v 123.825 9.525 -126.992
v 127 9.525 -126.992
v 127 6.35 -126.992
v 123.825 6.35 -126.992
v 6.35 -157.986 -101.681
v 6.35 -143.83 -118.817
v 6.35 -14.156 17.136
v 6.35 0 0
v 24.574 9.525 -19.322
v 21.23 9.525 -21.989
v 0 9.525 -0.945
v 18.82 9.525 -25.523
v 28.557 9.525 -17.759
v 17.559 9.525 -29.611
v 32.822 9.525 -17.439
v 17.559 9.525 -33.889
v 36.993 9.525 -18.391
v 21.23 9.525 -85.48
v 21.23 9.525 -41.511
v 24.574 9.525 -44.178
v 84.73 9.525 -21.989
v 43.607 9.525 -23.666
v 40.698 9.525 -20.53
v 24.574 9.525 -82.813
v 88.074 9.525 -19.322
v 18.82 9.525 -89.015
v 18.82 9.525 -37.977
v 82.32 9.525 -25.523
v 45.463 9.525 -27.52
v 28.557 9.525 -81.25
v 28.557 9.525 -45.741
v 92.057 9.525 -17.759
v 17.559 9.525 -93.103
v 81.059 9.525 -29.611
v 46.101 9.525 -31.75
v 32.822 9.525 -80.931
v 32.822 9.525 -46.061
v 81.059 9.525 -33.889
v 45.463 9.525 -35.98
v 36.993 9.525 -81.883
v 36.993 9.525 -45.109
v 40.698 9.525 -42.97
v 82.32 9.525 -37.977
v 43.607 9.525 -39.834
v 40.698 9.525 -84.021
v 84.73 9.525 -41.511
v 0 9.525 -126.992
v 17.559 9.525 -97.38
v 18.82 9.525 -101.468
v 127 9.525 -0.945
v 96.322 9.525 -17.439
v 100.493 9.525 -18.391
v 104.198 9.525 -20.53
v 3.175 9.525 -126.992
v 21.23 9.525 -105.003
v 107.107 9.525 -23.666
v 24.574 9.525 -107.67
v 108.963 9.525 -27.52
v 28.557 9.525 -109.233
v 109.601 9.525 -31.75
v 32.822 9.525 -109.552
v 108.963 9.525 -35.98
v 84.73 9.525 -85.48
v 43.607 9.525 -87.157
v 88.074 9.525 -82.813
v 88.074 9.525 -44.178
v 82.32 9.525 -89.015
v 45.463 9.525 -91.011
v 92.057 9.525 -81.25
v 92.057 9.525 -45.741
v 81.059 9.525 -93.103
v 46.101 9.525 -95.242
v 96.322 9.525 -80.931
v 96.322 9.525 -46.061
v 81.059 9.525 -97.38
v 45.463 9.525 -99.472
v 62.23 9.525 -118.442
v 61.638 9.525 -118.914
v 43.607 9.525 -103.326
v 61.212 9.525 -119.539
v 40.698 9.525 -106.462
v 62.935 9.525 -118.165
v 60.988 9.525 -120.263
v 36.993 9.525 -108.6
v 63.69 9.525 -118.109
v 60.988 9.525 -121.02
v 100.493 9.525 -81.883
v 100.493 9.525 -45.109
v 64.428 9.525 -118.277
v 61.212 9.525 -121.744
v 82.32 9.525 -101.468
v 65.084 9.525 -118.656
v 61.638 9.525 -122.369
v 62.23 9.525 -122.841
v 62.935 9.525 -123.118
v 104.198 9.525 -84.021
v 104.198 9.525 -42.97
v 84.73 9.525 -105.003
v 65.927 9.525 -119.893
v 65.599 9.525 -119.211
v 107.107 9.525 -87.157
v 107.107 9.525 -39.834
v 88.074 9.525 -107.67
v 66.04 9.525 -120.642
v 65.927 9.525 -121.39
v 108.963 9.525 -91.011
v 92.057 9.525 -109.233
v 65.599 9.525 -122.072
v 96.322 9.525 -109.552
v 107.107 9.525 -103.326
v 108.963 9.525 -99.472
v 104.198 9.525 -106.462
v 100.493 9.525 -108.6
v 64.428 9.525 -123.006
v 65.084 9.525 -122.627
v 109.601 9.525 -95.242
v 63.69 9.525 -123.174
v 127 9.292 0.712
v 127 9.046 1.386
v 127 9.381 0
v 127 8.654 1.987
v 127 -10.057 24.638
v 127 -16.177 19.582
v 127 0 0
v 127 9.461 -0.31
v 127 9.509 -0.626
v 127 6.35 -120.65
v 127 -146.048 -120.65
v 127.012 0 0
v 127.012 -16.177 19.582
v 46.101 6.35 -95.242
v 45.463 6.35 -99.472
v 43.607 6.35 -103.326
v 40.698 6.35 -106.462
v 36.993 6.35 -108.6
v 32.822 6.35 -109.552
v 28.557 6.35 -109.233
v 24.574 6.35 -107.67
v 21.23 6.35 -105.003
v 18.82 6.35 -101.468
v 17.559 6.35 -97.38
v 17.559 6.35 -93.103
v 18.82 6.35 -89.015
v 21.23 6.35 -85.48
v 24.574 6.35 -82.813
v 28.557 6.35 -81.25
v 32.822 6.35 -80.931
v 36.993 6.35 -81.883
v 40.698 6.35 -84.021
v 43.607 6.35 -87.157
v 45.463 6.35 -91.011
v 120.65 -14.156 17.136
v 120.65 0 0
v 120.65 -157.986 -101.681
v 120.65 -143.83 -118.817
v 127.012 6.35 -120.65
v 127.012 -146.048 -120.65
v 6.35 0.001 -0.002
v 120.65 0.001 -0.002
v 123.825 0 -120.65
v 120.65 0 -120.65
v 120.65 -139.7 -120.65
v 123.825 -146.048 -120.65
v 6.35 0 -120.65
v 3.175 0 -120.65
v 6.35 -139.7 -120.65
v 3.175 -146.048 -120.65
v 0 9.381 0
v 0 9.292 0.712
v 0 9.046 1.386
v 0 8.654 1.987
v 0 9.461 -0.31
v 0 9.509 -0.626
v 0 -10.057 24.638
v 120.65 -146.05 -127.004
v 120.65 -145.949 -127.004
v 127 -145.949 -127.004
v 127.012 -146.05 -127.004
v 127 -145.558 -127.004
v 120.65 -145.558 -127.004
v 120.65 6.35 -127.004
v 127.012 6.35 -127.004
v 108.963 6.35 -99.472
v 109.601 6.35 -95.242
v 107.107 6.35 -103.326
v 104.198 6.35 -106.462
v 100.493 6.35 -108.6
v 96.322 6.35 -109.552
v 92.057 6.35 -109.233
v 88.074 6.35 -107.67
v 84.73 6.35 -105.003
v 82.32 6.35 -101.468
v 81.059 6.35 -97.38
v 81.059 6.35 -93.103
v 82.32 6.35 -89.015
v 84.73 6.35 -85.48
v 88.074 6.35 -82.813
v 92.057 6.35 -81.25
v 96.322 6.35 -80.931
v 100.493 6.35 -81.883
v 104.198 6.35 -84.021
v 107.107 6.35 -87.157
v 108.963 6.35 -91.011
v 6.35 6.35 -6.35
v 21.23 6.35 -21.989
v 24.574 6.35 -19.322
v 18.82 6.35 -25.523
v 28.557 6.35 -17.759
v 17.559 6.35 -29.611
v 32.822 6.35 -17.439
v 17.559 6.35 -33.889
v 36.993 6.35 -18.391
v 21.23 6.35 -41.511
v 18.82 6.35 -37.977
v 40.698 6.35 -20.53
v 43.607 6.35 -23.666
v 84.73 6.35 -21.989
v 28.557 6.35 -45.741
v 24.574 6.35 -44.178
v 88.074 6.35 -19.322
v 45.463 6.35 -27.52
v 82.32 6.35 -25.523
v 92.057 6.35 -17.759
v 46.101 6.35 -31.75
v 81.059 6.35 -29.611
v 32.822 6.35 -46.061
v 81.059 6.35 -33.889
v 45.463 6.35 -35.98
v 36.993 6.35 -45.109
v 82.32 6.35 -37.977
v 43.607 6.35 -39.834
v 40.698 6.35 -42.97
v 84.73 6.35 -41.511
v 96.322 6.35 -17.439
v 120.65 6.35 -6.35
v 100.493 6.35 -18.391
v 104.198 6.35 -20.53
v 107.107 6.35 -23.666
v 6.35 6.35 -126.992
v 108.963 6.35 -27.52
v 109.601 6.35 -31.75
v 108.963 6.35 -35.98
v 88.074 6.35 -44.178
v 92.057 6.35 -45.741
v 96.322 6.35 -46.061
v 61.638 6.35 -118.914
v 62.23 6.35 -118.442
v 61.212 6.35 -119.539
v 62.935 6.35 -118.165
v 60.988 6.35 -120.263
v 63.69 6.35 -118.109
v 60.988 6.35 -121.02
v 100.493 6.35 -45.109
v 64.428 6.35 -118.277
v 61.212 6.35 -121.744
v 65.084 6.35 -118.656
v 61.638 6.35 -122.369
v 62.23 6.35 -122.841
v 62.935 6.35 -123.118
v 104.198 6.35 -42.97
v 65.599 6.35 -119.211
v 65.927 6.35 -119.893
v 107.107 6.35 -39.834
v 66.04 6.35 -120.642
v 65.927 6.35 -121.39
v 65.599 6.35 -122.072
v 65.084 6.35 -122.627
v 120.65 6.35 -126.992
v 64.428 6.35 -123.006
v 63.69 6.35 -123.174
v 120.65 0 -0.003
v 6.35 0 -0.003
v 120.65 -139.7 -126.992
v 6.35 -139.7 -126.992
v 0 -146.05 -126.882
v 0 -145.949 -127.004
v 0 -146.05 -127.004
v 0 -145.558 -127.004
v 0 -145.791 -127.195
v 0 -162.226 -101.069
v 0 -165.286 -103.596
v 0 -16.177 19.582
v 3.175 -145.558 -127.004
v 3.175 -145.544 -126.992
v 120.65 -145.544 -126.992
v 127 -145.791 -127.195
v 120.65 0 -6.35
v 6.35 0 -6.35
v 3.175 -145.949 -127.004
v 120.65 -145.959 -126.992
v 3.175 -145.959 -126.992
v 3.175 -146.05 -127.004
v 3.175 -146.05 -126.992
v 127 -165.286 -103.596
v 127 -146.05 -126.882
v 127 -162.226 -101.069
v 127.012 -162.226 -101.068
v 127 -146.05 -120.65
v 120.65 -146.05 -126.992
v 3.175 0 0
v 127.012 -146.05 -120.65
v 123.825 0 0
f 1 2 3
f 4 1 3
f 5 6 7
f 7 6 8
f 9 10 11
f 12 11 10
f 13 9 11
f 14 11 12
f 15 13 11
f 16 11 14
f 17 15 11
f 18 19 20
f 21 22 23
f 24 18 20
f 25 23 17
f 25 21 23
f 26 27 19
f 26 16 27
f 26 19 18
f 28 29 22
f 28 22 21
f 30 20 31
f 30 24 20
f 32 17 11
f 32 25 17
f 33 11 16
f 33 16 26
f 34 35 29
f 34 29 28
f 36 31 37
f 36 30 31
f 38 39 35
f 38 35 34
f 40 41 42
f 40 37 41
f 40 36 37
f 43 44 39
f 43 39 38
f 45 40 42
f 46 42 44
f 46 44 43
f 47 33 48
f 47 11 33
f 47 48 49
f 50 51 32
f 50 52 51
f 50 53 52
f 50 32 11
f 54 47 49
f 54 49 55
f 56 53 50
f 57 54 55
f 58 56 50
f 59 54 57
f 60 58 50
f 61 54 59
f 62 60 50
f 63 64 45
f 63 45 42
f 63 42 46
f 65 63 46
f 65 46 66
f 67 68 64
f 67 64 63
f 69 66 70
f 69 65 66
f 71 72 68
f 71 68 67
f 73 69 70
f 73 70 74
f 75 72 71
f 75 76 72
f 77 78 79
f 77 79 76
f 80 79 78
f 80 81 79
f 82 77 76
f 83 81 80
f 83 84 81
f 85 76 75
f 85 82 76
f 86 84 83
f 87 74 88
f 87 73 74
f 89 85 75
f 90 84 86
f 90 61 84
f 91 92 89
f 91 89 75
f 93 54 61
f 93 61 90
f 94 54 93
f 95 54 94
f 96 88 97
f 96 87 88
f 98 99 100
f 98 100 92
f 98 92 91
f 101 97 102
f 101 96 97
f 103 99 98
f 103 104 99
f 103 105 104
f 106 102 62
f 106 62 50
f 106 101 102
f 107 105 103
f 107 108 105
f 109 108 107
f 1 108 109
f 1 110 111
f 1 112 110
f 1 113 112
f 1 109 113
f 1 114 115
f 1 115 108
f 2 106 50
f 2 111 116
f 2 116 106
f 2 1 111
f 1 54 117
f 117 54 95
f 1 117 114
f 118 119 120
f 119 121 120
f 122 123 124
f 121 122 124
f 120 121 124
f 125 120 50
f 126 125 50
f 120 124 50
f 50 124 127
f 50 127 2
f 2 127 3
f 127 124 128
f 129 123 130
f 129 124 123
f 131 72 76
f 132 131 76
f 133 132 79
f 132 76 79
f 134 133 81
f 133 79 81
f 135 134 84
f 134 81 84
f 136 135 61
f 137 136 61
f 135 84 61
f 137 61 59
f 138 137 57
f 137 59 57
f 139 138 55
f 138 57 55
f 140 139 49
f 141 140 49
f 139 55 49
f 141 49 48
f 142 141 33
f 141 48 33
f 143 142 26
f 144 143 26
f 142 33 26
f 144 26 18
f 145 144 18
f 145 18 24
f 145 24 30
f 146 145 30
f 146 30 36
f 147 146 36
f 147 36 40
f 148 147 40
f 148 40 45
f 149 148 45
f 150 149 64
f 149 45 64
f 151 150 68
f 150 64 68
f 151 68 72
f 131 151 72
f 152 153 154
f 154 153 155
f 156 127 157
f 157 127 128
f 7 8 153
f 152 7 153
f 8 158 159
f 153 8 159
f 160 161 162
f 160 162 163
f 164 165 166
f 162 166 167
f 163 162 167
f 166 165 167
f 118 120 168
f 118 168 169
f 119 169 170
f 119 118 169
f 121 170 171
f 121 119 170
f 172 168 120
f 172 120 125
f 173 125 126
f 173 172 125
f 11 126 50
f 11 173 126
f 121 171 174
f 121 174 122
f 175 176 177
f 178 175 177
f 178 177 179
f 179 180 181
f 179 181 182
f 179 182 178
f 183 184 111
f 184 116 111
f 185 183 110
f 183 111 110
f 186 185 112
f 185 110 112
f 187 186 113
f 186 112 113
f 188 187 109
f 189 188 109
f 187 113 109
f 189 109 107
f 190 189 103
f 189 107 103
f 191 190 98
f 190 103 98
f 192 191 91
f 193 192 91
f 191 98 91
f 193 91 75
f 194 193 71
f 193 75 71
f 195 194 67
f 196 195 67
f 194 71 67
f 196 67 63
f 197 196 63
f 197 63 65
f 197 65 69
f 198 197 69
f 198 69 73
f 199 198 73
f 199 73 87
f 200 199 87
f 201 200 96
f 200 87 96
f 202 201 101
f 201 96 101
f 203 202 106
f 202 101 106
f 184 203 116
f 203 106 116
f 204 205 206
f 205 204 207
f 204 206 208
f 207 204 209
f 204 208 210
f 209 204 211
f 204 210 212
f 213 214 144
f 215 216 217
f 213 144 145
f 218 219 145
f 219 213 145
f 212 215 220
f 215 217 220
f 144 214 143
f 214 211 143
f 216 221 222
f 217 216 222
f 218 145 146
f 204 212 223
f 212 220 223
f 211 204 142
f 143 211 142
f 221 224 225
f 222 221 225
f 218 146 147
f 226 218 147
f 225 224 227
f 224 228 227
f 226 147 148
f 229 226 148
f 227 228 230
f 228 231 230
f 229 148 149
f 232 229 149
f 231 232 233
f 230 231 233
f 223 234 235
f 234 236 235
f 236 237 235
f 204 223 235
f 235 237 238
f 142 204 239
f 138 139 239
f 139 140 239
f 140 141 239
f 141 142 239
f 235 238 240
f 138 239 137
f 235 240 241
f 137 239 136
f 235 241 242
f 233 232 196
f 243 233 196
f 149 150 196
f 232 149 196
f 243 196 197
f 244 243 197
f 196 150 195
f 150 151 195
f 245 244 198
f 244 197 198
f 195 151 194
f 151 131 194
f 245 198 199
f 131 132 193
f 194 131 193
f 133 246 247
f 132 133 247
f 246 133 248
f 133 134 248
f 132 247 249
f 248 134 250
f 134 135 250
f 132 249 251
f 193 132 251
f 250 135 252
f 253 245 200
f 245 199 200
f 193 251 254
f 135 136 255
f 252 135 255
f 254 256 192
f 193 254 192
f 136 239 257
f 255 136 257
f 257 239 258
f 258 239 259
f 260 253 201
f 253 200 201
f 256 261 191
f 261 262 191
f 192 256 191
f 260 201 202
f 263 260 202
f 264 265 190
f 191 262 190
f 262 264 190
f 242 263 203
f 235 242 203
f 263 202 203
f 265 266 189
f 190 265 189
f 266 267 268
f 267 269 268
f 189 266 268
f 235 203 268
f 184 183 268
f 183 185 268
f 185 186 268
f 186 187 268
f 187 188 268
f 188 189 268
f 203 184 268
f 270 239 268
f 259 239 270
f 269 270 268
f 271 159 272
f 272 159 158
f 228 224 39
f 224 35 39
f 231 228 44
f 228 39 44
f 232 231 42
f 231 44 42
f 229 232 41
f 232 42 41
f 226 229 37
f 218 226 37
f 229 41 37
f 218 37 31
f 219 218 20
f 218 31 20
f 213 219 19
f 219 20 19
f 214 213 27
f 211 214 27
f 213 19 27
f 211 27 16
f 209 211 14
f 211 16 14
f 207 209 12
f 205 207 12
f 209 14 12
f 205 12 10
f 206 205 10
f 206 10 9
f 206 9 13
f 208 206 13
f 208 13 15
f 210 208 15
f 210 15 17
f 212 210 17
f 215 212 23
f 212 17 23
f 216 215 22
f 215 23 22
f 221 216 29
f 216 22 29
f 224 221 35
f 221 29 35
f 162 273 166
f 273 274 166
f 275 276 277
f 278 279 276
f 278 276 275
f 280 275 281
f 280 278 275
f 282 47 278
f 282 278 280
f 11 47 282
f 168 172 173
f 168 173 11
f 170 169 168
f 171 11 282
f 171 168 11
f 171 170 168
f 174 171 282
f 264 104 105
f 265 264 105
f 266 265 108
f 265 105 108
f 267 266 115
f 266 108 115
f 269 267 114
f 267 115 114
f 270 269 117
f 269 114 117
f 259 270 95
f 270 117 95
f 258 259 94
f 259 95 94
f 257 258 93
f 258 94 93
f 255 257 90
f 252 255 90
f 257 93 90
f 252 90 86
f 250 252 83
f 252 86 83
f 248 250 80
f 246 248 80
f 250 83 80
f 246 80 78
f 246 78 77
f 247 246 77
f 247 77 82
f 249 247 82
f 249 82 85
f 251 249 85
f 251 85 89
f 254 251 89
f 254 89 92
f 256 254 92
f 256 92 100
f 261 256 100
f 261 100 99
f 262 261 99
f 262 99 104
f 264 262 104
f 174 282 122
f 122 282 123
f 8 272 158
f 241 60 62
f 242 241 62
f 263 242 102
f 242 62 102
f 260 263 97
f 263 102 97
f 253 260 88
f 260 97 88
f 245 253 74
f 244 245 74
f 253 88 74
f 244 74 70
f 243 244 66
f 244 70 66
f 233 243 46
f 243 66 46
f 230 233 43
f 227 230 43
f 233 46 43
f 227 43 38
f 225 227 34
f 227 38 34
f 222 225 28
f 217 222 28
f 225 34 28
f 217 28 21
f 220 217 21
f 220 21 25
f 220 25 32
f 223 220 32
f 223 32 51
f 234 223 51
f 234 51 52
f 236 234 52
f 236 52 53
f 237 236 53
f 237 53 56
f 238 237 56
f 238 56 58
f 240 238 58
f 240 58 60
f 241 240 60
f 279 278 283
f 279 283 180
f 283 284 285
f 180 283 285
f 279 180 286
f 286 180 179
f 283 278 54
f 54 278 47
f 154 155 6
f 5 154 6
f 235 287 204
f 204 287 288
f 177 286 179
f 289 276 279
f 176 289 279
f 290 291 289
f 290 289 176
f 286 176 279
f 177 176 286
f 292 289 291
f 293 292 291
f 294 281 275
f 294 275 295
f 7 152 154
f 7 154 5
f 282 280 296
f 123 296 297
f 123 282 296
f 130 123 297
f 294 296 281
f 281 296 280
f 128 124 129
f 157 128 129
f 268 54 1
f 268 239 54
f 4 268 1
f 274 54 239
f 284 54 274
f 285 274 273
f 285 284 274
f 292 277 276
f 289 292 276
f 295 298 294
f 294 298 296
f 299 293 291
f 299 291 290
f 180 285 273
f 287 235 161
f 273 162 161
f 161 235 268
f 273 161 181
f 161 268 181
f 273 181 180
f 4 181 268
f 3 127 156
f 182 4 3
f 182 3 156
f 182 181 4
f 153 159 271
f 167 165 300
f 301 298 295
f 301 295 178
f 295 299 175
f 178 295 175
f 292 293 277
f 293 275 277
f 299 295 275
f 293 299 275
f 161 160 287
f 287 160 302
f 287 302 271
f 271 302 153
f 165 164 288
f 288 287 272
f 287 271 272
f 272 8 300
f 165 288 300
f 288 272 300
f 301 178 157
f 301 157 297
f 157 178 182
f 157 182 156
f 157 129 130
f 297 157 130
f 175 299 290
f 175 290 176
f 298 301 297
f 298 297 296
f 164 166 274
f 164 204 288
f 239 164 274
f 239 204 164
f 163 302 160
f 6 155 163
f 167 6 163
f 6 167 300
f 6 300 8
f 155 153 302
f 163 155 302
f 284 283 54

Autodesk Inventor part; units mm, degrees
ref_plane "YZ Plane" through (0, 0, 0) normal (1, 0, 0) x (0, 1, 0)
ref_plane "XZ Plane" through (0, 0, 0) normal (0, 1, 0) x (-1, 0, 0)
ref_plane "XY Plane" through (0, 0, 0) normal (0, 0, 1) x (1, 0, 0)
sketch "Sketch1" plane through (0, 0, 0) normal (0, 1, 0) x (-1, 0, 0)
  line L0 (0, 0) -> (-127, 0)
  line L1 (-127, 0) -> (-127, -6.35)
  line L2 (-127, -6.35) -> (0, -6.35)
  line L3 (0, -6.35) -> (0, 0)
  line L4 (0, -6.35) -> (-6.35, -6.35)
  line L5 (-6.35, -6.35) -> (-6.35, -127)
  line L6 (-6.35, -127) -> (0, -127)
  line L7 (0, -127) -> (0, -6.35)
  line L8 (-127, -6.35) -> (-120.65, -6.35)
  line L9 (-120.65, -6.35) -> (-120.65, -127)
  line L10 (-120.65, -127) -> (-127, -127)
  line L11 (-127, -127) -> (-127, -6.35)
  dimension "d0" = 127
  dimension "d1" = 6.35
  dimension "d2" = 6.35
  dimension "d3" = 120.65
  dimension "d4" = 120.65
  dimension "d5" = 6.35
extrude "Extrusion1" add sketch "Sketch1" along normal blind 6.35
sketch "Sketch2" plane through (127, 0, 0) normal (1, 0, 0) x (0, 0, -1)
  line L0 (127, 6.35) -> (120.65, 0)
  line L1 (6.35, 0) -> (127, 0) projected
  line L2 (127, 0) -> (127, 6.35) projected
  line L3 (120.65, 0) -> (127, 0)
  line L4 (127, 0) -> (127, 6.35) projected
  line L5 (127, 6.35) -> (127, 0)
  point P0 (0, 0)
  dimension "d8" = 135
extrude "Extrusion2" cut sketch "Sketch2" against normal blind 152.4
sketch "Sketch4" plane through (0, 6.35, 0) normal (0, 1, 0) x (1, 0, 0)
  line L0 (127, 120.65) -> (127, 127)
  line L1 (127, 120.65) -> (127, 127) projected
  line L2 (127, 127) -> (120.65, 127)
  line L3 (120.65, 127) -> (120.65, 120.65)
  line L4 (120.65, 120.65) -> (127, 120.65)
  point P0 (0, 0)
extrude "Extrusion3" cut sketch "Sketch4" against normal blind 152.4
sketch "Sketch5" plane through (0, 6.35, 0) normal (0, 1, 0) x (1, 0, 0)
  line L0 (120.65, 120.65) -> (120.65, 127.0036)
  line L1 (120.65, 127.0036) -> (127.0123, 127.0036)
  line L2 (127.0123, 127.0036) -> (127.0123, 120.65)
  line L3 (127.0123, 120.65) -> (120.65, 120.65)
  point P0 (0, 0)
extrude "Extrusion4" add sketch "Sketch5" against normal blind 152.4
sketch "Sketch6" plane through (0, 6.35, 0) normal (0, 1, 0) x (1, 0, 0)
  line L0 (0, 127) -> (0, 120.65)
  line L1 (0, 127) -> (0, 120.65) projected
  line L2 (0, 120.65) -> (6.35, 120.65)
  line L3 (0, 120.65) -> (6.35, 120.65) projected
  line L4 (6.35, 120.65) -> (6.35, 127)
  line L5 (6.35, 127) -> (0, 127)
  point P0 (0, 0)
extrude "Extrusion5" cut sketch "Sketch6" against normal blind 101.6
sketch "Sketch7" plane through (0, 6.35, 0) normal (0, 1, 0) x (1, 0, 0)
  line L0 (0, 120.65) -> (6.35, 120.65)
  line L1 (6.35, 120.65) -> (6.35, 126.9915)
  line L2 (6.35, 126.9915) -> (0, 126.9915)
  line L3 (0, 126.9915) -> (0, 120.65)
  point P0 (0, 0)
extrude "Extrusion6" add sketch "Sketch7" against normal blind 152.4
sketch "Sketch8" plane through (6.35, 0, -6.35) normal (1, 0, 0) x (0, 0, -1)
  line L0 (120.6415, 6.35) -> (120.6415, -146.05) projected
  line L1 (114.3, -146.05) -> (120.6415, -146.05)
  line L2 (120.6415, -146.05) -> (120.6415, -139.7)
  line L3 (120.6415, -139.7) -> (114.3, -139.7)
  line L4 (114.3, -139.7) -> (114.3, -146.05)
  point P0 (-6.35, 0)
  dimension "d19" = 6.35
extrude "Extrusion7" add sketch "Sketch8" along normal blind 120.65
sketch "Sketch9" plane through (0, 6.35, 0) normal (0, 1, 0) x (1, 0, 0)
  line L0 (0, 126.9915) -> (127, 126.9915)
  line L1 (127, 126.9915) -> (127, 0)
  line L2 (127, 0) -> (0, 0)
  line L3 (0, 0) -> (0, 126.9915)
extrude "Extrusion8" add sketch "Sketch9" along normal blind 3.175
sketch "Sketch10" plane through (0, 9.525, 0) normal (0, 1, 0) x (1, 0, 0)
  circle A0 centre (31.75, 95.2415) radius 14.351
  circle A1 centre (95.25, 95.2415) radius 14.351
  circle A2 centre (31.75, 31.75) radius 14.351
  circle A3 centre (95.25, 31.75) radius 14.351
  line L0 (0, 126.9915) -> (0, 0) projected
  line L1 (127, 0) -> (127, 126.9915) projected
  line L2 (127, 126.9915) -> (0, 126.9915) projected
  line L3 (0, 0) -> (127, 0) projected
  dimension "d24" = 28.702
  dimension "d25" = 28.702
  dimension "d26" = 28.702
  dimension "d27" = 28.702
  dimension "d28" = 31.75
  dimension "d29" = 31.75
  dimension "d30" = 31.75
  dimension "d31" = 31.75
  dimension "d32" = 31.75
  dimension "d33" = 31.75
  dimension "d34" = 31.75
  dimension "d35" = 31.75
extrude "Extrusion9" cut sketch "Sketch10" against normal blind 25.4 contours A0 | A1 | A2 | A3
ref_plane "Work Plane1" through (0, 0, 0) normal (0, -0.6368859, 0.7709581) x (1, 0, 0)
sketch "Sketch12" plane through (127, 0, -120.65) normal (1, 0, 0) x (0, 0, -1)
  line L0 (6.3415, 9.525) -> (6.3536, -146.05)
  line L1 (6.3536, -146.05) -> (0, -146.05)
  line L2 (6.3536, -146.05) -> (0, -146.05) projected
  line L3 (0, -146.05) -> (-120.65, 0)
  line L4 (-120.65, 0) -> (-120.65, 9.525)
  line L5 (-120.65, 0) -> (-120.65, 9.525) projected
  line L6 (-120.65, 9.525) -> (6.3415, 9.525)
  line L7 (-120.65, 9.525) -> (6.3415, 9.525) projected
extrude "Extrusion11" add sketch "Sketch12" against normal blind 3.175
sketch "Sketch13" plane through (0, -146.05, -126.9915) normal (-1, 0, 0) x (0, 0, 1)
  line L0 (-0.0121, 0) -> (0, 155.575)
  line L1 (0, 155.575) -> (126.9915, 155.575)
  line L2 (126.9915, 155.575) -> (0, 155.575) projected
  line L3 (126.9915, 155.575) -> (126.9915, 146.05)
  line L4 (126.9915, 146.05) -> (6.3415, 0)
  line L5 (6.3415, 0) -> (126.9915, 146.05) projected
  line L6 (6.3415, 0) -> (-0.0121, 0)
extrude "Extrusion12" add sketch "Sketch13" against normal blind 3.175
sketch "Sketch15" plane through (0, 0, 0) normal (0, -0.6368859, 0.7709581) x (1, 0, 0)
  line L0 (127.0123, -189.4387) -> (0, -189.4387)
  line L1 (0, -189.4387) -> (0, 0)
  line L2 (0, 0) -> (127.0123, 0)
  line L3 (127.0123, 0) -> (127.0123, -189.4387)
extrude "Extrusion14" add sketch "Sketch15" along normal blind 25.4
sketch "Sketch16" plane through (0, 0, 0) normal (0, 0.6368859, -0.7709581) x (-1, 0, 0)
  line L0 (-6.35, 0.8514) -> (-120.65, 0.8514)
  line L1 (-120.65, 0.8514) -> (-120.65, -186.5598)
  line L2 (-120.65, -186.5598) -> (-6.35, -186.5598)
  line L3 (-6.35, -186.5598) -> (-6.35, 0.8514)
  point P0 (0, 0)
extrude "Extrusion15" cut sketch "Sketch16" against normal blind 22.225
sketch "Sketch17" plane through (0, -16.1769, 19.5823) normal (0, 0.7709581, 0.6368859) x (1, 0, 0)
  line L0 (127, 122.4603) -> (127, 25.4) projected
  line L1 (0, 0) -> (127, 0)
  line L2 (127, 0) -> (127, 31.3747)
  line L3 (127, 31.3747) -> (0, 31.3747)
  line L4 (0, 31.3747) -> (0, 0)
  point P0 (0, 25.4)
extrude "Extrusion16" add sketch "Sketch17" along normal blind 7.9375
fillet "Fillet1" radius 3.175 2 edges at (63.5, 9.525, 0) (63.5, 9.9247, 0.4491)
sketch "Sketch19" plane through (0, -146.05, -120.65) normal (0, -0.7709581, -0.6368859) x (1, 0, 0)
  line L0 (127, 25.3989) -> (0, 25.3989)
  line L1 (0, 25.3989) -> (0, -5.2114)
  line L2 (0, -5.2114) -> (127, -5.2114)
  line L3 (127, -5.2114) -> (127, 25.3989)
  point P0 (0, -0.0011)
extrude "Extrusion17" add sketch "Sketch19" along normal blind 3.9688
sketch "Sketch23" plane through (0, 9.525, 0) normal (0, 1, 0) x (1, 0, 0)
  line L0 (6.35, 118.8173) -> (120.65, 118.8173) projected
  line L1 (123.825, 126.9915) -> (3.175, 126.9915) projected
  circle A0 centre (63.5, 120.6415) radius 2.54
  line L2 (0, 126.9915) -> (0, 0.9451) projected
  line L3 (127, 0.9451) -> (127, 126.9915) projected
  point P0 (0, 0)
  dimension "d78" = 6.35
  dimension "d80" = 63.5
  dimension "d82" = 5.08
extrude "Extrusion21" cut sketch "Sketch23" against normal blind 7.62
properties part number "button_angle"
